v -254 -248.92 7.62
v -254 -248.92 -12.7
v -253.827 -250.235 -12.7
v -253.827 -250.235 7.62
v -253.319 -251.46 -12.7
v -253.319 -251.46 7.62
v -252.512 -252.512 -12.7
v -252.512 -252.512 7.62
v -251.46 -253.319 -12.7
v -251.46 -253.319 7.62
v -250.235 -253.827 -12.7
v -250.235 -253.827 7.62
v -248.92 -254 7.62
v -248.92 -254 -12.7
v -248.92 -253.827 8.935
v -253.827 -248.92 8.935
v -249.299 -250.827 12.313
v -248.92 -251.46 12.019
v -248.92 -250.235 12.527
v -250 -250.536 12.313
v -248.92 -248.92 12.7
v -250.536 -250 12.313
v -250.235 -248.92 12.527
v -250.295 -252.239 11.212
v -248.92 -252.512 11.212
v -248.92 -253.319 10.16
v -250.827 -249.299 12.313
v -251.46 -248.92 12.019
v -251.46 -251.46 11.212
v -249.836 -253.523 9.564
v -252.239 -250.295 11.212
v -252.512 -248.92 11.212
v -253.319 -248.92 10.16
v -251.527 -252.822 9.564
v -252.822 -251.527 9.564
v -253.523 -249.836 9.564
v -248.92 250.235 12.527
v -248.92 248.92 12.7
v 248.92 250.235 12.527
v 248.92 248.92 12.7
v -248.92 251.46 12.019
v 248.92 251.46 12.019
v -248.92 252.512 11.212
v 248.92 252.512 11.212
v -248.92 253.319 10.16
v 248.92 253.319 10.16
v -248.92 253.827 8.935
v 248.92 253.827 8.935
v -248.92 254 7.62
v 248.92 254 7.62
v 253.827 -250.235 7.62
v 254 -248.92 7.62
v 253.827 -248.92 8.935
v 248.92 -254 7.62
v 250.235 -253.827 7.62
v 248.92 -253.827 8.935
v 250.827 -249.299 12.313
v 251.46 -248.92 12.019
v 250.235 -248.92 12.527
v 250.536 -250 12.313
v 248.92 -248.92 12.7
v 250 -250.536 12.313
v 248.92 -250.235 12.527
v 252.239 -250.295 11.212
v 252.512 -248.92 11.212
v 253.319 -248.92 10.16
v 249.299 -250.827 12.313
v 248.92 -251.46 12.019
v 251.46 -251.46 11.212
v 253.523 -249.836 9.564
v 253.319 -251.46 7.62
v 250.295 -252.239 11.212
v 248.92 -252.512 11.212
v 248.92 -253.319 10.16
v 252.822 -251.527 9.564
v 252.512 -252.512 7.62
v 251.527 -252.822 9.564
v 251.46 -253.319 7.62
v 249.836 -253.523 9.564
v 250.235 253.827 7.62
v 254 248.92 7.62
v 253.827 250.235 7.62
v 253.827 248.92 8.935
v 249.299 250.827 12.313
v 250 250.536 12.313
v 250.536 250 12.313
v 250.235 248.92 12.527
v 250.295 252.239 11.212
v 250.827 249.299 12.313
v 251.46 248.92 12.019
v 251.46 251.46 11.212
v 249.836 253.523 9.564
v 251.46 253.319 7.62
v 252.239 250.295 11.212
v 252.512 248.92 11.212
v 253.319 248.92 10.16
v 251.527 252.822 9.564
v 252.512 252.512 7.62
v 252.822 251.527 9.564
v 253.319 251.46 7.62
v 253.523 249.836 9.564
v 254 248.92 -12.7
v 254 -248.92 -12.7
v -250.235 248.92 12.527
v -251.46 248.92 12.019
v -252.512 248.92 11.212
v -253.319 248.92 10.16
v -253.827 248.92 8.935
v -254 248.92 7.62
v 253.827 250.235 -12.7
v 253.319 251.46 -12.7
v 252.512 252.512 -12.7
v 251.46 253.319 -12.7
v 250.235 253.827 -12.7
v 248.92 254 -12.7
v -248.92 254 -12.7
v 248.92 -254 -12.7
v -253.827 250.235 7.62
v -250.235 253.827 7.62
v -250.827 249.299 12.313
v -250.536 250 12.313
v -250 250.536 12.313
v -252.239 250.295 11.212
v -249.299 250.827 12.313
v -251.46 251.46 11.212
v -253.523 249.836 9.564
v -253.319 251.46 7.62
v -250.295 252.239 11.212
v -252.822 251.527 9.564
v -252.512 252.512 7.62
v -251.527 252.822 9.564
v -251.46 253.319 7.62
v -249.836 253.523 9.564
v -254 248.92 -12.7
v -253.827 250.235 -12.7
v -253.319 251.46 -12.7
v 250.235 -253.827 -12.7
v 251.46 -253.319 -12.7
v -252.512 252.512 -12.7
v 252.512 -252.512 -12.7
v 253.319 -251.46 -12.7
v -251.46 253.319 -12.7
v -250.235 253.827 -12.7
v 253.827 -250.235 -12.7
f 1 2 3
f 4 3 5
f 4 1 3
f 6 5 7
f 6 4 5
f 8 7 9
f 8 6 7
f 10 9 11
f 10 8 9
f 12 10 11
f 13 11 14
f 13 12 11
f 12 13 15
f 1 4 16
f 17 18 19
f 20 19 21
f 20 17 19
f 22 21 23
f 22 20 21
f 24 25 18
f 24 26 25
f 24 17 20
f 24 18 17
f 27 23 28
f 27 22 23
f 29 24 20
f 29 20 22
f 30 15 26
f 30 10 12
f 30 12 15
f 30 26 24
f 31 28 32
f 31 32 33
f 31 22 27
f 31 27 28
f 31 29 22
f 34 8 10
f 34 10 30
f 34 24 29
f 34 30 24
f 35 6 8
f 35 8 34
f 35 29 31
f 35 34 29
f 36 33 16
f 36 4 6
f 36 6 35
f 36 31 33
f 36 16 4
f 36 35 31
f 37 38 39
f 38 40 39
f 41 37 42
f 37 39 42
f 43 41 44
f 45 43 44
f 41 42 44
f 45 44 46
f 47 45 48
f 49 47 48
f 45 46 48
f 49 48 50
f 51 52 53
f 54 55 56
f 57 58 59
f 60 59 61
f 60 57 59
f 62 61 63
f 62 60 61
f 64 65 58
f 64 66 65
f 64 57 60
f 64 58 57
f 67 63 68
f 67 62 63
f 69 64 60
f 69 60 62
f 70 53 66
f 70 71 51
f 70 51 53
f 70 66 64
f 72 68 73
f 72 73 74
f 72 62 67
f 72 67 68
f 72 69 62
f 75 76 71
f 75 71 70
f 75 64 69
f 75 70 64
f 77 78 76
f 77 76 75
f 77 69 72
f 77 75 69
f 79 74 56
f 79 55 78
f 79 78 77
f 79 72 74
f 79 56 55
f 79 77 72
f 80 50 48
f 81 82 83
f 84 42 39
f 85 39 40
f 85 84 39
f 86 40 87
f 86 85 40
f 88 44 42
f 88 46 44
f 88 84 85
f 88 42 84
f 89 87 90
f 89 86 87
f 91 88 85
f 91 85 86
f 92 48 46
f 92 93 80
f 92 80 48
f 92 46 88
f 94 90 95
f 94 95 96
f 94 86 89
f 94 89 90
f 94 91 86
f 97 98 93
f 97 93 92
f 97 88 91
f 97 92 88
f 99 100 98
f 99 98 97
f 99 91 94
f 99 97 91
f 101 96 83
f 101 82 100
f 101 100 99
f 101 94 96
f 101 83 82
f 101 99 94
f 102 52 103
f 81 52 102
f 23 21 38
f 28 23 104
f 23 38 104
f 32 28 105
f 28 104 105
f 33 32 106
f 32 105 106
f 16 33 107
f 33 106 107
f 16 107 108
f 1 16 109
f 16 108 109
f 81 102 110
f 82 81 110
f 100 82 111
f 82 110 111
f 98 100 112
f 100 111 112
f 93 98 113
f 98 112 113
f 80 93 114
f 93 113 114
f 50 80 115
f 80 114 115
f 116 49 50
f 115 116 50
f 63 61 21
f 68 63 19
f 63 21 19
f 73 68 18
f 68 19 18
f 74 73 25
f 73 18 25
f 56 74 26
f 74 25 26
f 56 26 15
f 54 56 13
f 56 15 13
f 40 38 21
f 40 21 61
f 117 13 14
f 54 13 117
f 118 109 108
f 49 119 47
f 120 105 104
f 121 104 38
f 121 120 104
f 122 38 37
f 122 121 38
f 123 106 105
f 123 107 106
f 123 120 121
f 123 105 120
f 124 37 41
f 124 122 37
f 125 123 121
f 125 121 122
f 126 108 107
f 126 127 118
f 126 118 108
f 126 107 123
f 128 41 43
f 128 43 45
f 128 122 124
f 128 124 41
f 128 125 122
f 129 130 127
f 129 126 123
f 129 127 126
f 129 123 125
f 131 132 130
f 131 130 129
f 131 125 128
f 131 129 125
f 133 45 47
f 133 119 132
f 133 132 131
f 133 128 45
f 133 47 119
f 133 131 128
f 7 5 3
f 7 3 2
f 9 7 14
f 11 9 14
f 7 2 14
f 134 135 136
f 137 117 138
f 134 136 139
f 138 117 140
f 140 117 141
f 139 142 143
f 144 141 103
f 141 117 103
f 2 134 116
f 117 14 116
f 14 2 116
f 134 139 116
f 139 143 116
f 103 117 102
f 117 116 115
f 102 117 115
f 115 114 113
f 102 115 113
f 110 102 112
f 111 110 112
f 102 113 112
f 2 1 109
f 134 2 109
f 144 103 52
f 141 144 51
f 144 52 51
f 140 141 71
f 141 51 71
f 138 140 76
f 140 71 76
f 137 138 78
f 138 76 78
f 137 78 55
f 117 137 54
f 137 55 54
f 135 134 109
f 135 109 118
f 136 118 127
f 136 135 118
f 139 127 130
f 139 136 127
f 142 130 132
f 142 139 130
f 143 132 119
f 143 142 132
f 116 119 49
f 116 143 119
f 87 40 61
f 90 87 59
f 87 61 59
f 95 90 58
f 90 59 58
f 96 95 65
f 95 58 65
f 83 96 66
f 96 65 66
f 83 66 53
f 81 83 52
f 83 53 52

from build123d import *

# Parameters (mm, degrees)
F0_W     = 508
F0_H     = 508
F1_DEPTH = 12.7
F2_R     = 5.08
F3_R     = 5.08


with BuildPart() as f1:
    # F0 (on Top) → F1 (new body, symmetric)
    with BuildSketch(Plane.XY):
        Rectangle(F0_W, F0_H)
    extrude(amount=F1_DEPTH, both=True)

    # F2
    f2_edges = [f1.edges().sort_by_distance(p)[0] for p in [
        (-254, -254, 0),
        (254, -254, 0),
        (254, 254, 0),
        (-254, 254, 0),
    ]]
    fillet(f2_edges, radius=F2_R)

    # F3
    f3_edges = [f1.edges().sort_by_distance(p)[0] for p in [
        (0, 254, 12.7),
        (252.512102, 252.512102, 12.7),
        (-252.512102, 252.512102, 12.7),
        (254, 0, 12.7),
        (-254, 0, 12.7),
        (252.512102, -252.512102, 12.7),
        (-252.512102, -252.512102, 12.7),
        (0, -254, 12.7),
    ]]
    fillet(f3_edges, radius=F3_R)


solid = f1.part
